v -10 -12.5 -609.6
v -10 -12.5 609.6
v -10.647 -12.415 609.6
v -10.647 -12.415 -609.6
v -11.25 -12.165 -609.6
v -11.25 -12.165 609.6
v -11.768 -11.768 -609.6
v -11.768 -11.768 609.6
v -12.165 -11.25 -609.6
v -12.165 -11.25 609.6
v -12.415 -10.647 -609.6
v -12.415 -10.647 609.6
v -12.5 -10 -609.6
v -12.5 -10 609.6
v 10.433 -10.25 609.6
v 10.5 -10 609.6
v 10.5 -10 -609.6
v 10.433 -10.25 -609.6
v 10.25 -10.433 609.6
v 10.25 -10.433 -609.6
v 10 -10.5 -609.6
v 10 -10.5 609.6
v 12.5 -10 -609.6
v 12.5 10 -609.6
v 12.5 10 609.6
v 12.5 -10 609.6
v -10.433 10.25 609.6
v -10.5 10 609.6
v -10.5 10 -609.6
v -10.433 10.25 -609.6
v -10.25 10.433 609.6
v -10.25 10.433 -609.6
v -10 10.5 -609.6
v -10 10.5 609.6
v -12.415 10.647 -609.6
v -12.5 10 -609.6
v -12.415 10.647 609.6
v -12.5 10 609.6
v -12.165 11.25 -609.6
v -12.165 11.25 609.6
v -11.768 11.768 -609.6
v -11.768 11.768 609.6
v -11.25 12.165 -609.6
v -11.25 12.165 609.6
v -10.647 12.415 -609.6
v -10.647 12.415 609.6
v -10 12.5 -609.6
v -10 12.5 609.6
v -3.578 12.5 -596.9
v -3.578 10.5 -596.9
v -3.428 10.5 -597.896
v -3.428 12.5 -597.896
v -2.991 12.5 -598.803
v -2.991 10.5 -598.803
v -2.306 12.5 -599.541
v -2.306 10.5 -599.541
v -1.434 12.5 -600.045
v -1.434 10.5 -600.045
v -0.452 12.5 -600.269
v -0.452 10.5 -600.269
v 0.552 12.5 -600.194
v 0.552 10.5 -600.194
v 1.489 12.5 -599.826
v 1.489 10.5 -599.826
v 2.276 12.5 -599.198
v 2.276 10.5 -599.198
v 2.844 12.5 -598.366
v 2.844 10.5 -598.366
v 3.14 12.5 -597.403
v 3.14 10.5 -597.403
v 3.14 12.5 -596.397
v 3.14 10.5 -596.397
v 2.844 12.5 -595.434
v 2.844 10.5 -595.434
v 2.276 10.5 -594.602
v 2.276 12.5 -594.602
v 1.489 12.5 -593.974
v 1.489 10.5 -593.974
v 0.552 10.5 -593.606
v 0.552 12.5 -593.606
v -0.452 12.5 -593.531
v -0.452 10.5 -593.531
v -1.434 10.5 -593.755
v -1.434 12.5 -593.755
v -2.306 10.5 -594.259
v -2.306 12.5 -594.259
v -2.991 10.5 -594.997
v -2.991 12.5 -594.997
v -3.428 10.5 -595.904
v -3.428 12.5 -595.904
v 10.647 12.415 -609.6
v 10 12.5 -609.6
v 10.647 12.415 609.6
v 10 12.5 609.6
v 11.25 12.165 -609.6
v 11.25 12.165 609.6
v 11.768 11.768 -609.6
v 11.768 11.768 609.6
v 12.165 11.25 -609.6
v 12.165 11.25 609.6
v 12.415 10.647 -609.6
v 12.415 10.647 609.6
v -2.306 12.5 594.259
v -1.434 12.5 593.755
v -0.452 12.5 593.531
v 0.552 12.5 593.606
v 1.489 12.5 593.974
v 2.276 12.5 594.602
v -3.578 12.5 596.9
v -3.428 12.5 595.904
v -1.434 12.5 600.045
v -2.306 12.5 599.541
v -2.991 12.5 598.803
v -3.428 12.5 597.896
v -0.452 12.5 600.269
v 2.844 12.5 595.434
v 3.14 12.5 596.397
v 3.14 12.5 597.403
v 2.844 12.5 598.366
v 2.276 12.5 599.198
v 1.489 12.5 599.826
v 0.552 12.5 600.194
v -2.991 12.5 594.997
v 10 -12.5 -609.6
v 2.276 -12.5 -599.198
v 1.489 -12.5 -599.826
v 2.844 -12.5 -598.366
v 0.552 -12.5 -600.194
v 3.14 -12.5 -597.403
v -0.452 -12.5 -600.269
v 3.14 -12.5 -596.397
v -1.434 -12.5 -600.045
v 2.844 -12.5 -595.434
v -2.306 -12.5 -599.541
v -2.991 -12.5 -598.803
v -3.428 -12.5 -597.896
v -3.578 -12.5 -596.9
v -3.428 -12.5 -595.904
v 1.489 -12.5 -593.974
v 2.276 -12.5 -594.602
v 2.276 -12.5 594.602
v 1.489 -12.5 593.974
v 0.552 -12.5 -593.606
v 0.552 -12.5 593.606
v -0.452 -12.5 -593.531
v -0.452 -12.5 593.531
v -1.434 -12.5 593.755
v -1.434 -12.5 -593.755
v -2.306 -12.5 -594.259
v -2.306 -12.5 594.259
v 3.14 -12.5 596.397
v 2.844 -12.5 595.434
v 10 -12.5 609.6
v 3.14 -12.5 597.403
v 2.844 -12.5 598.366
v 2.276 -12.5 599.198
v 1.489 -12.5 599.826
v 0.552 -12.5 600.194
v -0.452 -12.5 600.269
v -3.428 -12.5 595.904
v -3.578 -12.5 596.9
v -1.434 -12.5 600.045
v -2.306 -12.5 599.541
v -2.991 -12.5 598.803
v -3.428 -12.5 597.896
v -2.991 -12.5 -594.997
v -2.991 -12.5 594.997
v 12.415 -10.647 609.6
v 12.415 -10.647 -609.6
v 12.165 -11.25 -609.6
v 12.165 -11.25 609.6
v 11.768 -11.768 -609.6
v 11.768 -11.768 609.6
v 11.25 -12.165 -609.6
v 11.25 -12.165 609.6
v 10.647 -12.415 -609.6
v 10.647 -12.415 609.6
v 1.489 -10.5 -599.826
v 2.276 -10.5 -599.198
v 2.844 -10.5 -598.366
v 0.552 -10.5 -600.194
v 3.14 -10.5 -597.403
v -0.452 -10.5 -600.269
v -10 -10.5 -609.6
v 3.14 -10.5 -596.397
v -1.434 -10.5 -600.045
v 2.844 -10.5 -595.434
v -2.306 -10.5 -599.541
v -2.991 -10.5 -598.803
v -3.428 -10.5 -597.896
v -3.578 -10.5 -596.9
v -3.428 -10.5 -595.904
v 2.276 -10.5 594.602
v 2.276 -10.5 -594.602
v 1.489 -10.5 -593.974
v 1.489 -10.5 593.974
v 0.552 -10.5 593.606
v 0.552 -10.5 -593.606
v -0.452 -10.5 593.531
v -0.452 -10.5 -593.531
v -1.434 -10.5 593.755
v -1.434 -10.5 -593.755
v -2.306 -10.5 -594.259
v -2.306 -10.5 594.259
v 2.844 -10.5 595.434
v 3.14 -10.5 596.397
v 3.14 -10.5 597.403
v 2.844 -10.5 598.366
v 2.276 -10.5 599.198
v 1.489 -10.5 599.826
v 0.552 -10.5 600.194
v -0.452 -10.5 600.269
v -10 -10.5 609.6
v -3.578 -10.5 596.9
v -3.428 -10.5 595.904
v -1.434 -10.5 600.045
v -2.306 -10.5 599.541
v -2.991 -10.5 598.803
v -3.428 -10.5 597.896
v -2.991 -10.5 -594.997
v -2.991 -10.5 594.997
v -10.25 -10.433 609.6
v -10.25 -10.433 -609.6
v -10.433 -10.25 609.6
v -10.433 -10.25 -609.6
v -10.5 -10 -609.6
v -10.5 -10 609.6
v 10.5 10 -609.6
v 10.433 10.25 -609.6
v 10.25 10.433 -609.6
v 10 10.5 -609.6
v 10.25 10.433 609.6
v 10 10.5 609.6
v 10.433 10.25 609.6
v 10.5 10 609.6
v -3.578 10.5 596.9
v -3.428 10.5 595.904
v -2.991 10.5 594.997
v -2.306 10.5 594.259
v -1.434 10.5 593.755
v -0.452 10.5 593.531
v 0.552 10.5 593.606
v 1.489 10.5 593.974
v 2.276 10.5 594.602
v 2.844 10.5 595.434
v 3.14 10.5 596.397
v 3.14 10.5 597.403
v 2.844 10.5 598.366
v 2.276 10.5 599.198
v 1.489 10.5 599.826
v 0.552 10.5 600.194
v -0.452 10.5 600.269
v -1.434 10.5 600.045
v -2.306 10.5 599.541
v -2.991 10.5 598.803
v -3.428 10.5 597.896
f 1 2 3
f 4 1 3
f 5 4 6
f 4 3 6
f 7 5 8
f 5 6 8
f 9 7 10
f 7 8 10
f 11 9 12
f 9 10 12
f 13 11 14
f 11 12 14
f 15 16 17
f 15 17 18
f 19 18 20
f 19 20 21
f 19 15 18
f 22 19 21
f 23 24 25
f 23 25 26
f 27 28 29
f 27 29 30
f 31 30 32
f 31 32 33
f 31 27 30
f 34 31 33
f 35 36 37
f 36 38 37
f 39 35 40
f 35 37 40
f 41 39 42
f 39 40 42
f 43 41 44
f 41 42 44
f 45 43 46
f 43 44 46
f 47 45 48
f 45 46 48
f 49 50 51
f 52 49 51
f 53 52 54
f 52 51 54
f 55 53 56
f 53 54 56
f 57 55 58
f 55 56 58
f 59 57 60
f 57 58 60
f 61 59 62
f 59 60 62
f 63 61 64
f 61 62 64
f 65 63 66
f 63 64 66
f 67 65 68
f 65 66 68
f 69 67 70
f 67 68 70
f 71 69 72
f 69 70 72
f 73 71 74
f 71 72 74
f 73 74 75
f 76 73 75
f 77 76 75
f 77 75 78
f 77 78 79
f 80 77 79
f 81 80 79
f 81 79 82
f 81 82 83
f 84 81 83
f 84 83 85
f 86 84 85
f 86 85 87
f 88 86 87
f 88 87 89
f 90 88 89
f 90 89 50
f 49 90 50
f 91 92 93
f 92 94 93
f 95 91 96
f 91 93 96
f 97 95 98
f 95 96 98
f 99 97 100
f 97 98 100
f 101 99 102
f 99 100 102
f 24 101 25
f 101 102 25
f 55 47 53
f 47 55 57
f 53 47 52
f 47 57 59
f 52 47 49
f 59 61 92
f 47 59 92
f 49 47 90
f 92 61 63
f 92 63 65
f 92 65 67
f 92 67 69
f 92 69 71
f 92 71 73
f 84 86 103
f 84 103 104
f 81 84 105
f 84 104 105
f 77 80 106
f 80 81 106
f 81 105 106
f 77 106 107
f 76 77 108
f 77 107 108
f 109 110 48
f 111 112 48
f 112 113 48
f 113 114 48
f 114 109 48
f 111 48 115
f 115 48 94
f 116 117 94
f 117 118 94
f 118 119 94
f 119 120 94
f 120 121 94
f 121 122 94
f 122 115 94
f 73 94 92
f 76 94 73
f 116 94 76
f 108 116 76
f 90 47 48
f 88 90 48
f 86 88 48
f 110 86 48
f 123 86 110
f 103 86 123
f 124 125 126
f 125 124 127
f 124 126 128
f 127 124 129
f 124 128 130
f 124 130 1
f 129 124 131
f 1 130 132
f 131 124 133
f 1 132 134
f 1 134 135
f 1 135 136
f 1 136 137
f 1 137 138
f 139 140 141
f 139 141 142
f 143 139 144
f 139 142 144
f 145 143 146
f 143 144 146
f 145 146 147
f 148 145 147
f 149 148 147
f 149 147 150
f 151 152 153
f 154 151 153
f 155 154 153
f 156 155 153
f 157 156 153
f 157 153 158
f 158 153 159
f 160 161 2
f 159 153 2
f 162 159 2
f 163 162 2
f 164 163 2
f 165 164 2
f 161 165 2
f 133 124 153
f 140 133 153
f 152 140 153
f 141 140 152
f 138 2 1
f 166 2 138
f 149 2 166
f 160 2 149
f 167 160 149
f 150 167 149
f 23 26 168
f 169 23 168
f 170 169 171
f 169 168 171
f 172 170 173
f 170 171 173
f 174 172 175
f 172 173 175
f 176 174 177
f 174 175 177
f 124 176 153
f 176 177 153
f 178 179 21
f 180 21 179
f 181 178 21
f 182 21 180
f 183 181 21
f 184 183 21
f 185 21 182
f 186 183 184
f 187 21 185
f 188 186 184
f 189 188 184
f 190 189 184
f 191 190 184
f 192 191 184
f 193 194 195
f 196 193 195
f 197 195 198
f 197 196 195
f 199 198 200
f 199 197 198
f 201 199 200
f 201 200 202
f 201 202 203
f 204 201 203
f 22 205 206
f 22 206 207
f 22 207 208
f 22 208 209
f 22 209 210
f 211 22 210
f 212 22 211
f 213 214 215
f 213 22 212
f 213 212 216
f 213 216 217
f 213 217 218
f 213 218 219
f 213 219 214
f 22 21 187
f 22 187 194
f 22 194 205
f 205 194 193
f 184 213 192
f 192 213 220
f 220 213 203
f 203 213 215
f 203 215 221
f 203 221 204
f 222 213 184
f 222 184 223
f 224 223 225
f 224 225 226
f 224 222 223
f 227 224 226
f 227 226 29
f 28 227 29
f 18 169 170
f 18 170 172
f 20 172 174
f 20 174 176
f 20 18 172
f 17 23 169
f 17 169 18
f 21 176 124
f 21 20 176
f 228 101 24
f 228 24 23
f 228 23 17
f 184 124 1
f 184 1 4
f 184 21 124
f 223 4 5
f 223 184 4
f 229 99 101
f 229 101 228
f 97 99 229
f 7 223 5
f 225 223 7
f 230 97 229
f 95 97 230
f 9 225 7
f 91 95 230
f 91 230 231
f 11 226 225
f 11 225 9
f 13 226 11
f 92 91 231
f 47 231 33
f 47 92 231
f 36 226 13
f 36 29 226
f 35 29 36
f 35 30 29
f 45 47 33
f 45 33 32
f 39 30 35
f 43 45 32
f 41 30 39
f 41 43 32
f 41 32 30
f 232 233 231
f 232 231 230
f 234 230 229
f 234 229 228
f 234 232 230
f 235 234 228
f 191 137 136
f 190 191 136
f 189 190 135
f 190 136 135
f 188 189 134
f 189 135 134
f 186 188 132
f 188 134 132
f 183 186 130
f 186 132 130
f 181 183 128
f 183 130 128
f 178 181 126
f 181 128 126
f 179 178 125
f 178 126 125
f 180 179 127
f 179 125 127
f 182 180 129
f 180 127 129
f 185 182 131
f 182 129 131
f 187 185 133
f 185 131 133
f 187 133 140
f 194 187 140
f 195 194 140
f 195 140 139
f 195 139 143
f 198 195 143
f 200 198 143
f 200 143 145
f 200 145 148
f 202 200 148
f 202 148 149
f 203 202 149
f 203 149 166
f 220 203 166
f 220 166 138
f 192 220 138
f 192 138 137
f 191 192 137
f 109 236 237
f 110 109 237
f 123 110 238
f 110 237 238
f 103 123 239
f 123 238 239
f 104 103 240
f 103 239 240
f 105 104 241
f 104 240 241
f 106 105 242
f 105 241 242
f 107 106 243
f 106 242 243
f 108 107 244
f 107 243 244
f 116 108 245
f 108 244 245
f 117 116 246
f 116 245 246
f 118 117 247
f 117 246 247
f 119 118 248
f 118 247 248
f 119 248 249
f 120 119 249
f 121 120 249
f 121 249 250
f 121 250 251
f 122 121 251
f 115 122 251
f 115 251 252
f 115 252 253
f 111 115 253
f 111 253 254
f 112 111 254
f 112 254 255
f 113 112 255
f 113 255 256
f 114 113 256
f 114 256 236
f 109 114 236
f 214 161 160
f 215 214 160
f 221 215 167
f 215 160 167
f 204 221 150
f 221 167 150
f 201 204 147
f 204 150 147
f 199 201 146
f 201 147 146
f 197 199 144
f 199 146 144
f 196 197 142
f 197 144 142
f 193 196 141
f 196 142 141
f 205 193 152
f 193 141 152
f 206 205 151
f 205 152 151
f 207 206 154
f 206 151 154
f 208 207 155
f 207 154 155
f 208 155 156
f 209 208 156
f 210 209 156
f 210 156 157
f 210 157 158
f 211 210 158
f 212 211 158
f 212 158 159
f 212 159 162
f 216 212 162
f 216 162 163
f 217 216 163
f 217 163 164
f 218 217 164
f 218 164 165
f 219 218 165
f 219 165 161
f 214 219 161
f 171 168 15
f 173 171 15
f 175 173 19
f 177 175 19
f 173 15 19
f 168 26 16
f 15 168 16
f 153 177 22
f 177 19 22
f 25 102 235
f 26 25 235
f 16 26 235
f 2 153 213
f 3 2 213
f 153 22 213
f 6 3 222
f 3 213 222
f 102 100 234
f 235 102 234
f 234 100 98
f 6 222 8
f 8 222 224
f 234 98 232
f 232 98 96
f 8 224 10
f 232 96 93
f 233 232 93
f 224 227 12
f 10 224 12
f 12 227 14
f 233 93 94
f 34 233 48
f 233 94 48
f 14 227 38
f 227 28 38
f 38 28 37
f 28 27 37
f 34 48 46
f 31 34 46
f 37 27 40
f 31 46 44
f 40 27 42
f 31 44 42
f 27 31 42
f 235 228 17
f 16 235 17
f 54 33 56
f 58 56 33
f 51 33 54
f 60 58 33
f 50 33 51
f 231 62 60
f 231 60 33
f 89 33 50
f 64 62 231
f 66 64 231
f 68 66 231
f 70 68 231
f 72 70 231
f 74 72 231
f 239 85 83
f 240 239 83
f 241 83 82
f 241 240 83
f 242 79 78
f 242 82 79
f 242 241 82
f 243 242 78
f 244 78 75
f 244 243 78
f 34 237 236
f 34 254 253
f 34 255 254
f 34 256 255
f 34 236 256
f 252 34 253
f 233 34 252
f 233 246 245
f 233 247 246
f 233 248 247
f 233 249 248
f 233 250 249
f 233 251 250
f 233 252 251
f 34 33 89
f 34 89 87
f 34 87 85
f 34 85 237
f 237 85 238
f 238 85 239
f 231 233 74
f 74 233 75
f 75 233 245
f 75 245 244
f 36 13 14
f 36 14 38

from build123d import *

# Parameters (mm, degrees)
EXTRUDE_THIN1_DEPTH         = 609.6
F_1_4_CLEARANCE_HOLE1_D     = 6.7564
F_1_4_CLEARANCE_HOLE1_DEPTH = 25.4
F_1_4_CLEARANCE_HOLE1_TIP   = 2.029827343


with BuildPart() as part:
    # Sketch1 → Extrude-Thin1 (new, symmetric)
    with BuildSketch(Plane.XY):
        with BuildLine():
            Line((-12.5, -10), (-12.5, 10))
            ThreePointArc((-12.5, 10), (-11.767766953, 11.767766953), (-10, 12.5))
            Line((-10, 12.5), (10, 12.5))
            ThreePointArc((10, 12.5), (11.767766953, 11.767766953), (12.5, 10))
            Line((12.5, 10), (12.5, -10))
            ThreePointArc((12.5, -10), (11.767766953, -11.767766953), (10, -12.5))
            Line((10, -12.5), (-10, -12.5))
            ThreePointArc((-10, -12.5), (-11.767766953, -11.767766953), (-12.5, -10))
        make_face()
        with BuildLine():
            Line((-10.5, -10), (-10.5, 10))
            ThreePointArc((-10.5, 10), (-10.353553391, 10.353553391), (-10, 10.5))
            Line((-10, 10.5), (10, 10.5))
            ThreePointArc((10, 10.5), (10.353553391, 10.353553391), (10.5, 10))
            Line((10.5, 10), (10.5, -10))
            ThreePointArc((10.5, -10), (10.353553391, -10.353553391), (10, -10.5))
            Line((10, -10.5), (-10, -10.5))
            ThreePointArc((-10, -10.5), (-10.353553391, -10.353553391), (-10.5, -10))
        make_face(mode=Mode.SUBTRACT)
    extrude(amount=EXTRUDE_THIN1_DEPTH, both=True)

    # 1/4 Clearance Hole1
    with Locations(Plane(origin=(0, 12.5, 0), x_dir=(1, 0, 0), z_dir=(0, 1, 0))):
        with Locations((-0.2, 596.9), (-0.2, -596.9)):
            Hole(F_1_4_CLEARANCE_HOLE1_D / 2, depth=F_1_4_CLEARANCE_HOLE1_DEPTH)
            with Locations((0, 0, -(F_1_4_CLEARANCE_HOLE1_DEPTH + F_1_4_CLEARANCE_HOLE1_TIP / 2))):  # 118° drill point
                Cone(0, F_1_4_CLEARANCE_HOLE1_D / 2, F_1_4_CLEARANCE_HOLE1_TIP, mode=Mode.SUBTRACT)


solid = part.part
